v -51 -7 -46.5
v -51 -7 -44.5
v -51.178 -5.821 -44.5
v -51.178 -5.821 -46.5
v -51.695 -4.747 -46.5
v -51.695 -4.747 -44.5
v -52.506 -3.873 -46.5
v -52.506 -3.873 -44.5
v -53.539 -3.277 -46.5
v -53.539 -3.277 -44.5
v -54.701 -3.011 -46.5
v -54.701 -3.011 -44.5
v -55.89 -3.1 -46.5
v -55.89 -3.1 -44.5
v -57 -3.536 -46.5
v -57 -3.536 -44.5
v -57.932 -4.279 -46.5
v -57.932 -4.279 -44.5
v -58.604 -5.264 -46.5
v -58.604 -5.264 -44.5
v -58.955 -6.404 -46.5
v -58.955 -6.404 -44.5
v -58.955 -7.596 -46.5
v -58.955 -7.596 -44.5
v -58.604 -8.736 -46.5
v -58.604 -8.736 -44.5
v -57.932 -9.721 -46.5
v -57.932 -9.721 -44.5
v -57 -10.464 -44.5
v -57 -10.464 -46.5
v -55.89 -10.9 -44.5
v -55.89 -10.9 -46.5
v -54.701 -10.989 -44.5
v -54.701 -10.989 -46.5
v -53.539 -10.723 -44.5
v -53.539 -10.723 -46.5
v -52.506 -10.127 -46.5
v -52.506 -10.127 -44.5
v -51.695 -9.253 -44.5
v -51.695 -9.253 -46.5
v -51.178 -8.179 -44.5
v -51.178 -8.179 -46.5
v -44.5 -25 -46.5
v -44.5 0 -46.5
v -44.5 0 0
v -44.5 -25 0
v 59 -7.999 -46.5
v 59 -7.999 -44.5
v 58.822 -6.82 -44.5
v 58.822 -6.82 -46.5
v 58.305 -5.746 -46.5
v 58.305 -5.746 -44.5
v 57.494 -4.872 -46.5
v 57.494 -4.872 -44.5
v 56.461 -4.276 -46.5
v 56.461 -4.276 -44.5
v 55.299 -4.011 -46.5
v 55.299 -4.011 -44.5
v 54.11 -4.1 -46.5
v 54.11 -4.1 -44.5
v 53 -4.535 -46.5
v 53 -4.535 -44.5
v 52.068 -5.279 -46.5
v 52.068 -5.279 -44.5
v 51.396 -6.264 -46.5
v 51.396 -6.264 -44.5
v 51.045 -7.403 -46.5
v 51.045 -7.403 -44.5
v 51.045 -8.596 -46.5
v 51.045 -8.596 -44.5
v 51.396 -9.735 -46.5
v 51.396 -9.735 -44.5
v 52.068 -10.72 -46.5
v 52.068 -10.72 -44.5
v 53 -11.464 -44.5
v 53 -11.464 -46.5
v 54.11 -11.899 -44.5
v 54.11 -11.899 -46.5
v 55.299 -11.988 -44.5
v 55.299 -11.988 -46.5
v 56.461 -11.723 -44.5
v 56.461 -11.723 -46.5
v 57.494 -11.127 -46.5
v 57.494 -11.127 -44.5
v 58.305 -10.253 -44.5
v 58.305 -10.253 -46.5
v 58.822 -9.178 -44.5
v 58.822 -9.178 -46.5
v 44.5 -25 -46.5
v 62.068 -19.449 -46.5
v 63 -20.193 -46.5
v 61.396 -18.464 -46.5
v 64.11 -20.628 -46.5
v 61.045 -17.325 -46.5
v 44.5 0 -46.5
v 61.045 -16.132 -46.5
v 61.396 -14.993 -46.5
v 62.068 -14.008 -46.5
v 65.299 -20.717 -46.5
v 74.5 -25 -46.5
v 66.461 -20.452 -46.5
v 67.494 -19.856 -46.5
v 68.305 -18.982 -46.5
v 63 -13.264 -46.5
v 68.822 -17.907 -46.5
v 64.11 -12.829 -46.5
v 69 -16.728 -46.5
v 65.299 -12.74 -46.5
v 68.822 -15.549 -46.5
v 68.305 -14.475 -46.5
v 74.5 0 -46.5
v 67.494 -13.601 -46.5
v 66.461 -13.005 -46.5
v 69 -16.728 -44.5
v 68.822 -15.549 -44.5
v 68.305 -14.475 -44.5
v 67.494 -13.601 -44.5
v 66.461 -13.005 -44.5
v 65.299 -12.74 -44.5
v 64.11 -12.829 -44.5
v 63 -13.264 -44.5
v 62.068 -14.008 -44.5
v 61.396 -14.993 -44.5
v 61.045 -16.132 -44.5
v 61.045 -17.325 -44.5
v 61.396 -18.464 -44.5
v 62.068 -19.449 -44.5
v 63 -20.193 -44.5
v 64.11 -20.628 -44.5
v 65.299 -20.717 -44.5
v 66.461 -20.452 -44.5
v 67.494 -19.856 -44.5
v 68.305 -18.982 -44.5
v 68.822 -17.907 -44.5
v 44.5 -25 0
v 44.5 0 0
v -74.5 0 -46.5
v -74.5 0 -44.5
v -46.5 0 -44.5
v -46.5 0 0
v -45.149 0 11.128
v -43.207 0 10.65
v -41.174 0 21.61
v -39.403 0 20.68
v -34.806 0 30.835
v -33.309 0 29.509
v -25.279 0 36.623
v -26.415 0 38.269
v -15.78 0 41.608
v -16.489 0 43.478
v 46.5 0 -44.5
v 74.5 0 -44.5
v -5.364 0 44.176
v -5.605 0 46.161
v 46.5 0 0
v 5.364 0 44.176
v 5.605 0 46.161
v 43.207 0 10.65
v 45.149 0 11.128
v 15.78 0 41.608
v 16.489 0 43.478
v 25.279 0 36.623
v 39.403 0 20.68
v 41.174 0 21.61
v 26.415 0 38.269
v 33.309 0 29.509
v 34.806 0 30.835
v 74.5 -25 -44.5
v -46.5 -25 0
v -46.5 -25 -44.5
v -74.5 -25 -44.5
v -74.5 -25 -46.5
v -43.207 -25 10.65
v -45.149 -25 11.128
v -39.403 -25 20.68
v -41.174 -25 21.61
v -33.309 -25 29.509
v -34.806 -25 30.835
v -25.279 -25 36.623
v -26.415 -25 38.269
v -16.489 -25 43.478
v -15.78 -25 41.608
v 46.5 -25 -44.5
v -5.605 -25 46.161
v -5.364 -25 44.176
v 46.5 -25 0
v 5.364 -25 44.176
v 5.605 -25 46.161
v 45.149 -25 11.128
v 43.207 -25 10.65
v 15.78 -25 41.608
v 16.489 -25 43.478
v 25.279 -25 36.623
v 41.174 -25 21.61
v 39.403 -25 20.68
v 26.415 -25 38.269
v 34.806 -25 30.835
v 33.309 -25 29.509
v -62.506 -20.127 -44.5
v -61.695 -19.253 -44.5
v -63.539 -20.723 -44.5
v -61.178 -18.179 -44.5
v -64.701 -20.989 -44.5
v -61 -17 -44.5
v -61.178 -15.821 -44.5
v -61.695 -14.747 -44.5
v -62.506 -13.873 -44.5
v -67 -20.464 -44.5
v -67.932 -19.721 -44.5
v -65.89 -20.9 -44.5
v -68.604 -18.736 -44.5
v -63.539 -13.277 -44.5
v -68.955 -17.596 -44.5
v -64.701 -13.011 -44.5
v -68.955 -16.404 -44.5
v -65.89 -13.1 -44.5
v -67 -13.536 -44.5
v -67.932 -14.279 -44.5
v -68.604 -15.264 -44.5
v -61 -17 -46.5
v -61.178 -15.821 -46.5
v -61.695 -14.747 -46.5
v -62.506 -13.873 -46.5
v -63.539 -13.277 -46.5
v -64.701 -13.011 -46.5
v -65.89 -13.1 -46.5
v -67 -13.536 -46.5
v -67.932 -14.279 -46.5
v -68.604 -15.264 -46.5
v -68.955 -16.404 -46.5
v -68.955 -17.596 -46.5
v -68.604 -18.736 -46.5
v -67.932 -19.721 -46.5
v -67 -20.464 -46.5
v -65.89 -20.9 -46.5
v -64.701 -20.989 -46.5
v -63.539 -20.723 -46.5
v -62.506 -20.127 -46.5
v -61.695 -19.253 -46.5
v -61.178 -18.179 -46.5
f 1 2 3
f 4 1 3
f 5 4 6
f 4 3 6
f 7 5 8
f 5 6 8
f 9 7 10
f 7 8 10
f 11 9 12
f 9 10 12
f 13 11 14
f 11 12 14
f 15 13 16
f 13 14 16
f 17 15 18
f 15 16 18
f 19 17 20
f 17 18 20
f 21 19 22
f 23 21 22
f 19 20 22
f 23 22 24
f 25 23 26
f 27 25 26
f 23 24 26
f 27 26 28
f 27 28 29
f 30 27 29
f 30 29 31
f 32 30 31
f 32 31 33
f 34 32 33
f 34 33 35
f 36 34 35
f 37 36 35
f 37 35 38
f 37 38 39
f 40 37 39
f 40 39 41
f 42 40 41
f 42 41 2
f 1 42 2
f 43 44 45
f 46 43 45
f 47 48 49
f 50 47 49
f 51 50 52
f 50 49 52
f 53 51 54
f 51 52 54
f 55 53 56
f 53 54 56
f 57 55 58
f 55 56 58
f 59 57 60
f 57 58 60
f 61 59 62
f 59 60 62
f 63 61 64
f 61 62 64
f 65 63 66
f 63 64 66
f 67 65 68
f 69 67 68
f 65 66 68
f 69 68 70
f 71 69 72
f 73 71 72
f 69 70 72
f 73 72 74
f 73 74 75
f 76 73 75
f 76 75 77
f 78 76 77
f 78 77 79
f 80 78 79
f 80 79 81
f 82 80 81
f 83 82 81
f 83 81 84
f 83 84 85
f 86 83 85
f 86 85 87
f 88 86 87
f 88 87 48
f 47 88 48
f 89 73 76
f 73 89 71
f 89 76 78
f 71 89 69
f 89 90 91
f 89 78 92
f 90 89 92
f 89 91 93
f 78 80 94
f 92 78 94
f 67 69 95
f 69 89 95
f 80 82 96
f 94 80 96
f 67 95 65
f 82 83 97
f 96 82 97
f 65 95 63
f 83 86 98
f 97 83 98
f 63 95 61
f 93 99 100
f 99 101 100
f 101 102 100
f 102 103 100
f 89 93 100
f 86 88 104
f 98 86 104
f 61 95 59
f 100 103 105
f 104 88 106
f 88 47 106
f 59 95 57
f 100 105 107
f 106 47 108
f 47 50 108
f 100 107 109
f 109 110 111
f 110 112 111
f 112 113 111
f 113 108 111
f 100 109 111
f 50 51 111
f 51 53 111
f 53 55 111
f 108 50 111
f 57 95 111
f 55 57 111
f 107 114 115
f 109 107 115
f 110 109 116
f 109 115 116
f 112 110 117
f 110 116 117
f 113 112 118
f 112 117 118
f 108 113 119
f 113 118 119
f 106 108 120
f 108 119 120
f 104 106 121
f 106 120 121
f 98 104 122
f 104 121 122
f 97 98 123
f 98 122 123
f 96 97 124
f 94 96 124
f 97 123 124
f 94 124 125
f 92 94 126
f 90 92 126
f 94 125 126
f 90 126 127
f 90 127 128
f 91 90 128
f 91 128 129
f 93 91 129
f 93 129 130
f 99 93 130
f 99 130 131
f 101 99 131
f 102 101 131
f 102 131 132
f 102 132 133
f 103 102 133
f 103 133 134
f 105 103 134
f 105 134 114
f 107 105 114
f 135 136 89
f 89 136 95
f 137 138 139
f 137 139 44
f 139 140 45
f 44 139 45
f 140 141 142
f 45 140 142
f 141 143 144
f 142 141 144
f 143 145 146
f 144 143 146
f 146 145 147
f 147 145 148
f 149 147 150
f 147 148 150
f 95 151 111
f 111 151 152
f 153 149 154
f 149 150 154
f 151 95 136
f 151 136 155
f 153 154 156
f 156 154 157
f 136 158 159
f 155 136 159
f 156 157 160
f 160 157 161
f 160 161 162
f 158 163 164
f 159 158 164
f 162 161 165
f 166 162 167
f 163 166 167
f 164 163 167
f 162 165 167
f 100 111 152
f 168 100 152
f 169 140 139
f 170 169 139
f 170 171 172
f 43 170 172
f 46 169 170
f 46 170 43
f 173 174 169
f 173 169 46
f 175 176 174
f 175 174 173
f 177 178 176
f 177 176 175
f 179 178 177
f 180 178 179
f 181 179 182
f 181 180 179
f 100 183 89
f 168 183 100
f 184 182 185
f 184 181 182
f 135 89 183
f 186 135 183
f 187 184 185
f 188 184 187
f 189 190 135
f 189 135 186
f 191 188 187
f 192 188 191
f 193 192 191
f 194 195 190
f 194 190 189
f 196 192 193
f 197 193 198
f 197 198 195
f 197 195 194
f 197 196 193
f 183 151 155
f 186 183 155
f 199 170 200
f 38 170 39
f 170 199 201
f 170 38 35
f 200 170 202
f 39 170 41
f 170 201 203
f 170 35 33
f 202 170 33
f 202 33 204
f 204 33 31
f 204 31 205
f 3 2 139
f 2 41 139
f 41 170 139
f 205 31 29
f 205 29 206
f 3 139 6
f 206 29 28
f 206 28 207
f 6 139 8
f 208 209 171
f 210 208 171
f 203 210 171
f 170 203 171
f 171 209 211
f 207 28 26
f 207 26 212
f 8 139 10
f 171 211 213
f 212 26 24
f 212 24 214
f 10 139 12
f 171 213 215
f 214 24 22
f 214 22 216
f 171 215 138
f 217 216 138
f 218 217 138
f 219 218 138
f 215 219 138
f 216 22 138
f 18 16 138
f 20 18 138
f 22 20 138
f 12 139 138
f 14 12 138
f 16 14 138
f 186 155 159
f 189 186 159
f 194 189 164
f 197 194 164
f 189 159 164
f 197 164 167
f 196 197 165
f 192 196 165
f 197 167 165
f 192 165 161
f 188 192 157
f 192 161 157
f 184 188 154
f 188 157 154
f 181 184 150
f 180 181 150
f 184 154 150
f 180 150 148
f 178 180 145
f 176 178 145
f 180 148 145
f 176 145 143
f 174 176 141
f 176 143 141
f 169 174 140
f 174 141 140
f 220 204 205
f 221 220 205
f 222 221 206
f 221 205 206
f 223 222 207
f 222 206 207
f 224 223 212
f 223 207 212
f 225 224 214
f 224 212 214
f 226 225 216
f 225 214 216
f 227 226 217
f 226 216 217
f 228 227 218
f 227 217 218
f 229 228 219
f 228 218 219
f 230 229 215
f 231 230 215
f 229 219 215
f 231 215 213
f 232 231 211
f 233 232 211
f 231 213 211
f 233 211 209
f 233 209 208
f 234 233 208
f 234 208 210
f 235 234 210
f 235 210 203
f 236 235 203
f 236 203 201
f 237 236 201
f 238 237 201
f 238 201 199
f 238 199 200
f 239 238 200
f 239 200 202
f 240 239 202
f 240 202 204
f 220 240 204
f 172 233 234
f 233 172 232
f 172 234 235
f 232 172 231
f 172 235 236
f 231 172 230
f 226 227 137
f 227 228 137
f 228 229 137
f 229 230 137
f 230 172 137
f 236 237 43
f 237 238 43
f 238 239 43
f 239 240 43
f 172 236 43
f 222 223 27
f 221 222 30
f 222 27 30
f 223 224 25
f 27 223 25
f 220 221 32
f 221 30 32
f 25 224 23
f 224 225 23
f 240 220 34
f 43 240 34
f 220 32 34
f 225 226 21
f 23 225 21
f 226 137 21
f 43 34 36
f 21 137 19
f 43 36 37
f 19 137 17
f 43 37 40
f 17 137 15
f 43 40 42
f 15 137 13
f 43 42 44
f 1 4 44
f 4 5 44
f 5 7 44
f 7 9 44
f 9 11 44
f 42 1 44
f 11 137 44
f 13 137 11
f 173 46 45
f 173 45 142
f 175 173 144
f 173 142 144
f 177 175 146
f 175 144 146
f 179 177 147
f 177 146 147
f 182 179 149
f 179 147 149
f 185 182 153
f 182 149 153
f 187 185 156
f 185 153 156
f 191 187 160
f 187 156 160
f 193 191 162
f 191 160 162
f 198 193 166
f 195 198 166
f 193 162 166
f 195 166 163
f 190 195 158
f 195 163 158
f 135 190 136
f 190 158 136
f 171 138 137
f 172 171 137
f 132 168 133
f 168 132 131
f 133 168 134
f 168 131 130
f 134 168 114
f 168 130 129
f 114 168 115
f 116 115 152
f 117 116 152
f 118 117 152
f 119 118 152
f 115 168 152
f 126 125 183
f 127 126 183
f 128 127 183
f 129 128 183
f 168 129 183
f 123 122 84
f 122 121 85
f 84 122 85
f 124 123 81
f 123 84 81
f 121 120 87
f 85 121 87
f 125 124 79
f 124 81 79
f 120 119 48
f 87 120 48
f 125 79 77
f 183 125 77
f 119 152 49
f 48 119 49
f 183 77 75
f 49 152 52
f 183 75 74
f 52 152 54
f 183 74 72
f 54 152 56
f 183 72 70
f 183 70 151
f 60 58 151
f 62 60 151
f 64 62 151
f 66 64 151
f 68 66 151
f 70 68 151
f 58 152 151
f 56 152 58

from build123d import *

# Parameters (mm, degrees)
F1_DEPTH = 25
F2_R     = 4
F3_DEPTH = 2.001


with BuildPart() as f1:
    # F0 (on Front) → F1 (new body)
    with BuildSketch(Plane.XZ):
        with BuildLine():
            ThreePointArc((-44.5, 0), (0, 44.5), (44.5, 0))
            Line((44.5, 0), (44.5, -46.5))
            Line((44.5, -46.5), (74.5, -46.5))
            Line((74.5, -46.5), (74.5, -44.5))
            Line((74.5, -44.5), (46.5, -44.5))
            Line((46.5, -44.5), (46.5, 0))
            ThreePointArc((46.5, 0), (0, 46.5), (-46.5, 0))
            Line((-46.5, 0), (-46.5, -44.5))
            Line((-46.5, -44.5), (-74.5, -44.5))
            Line((-74.5, -44.5), (-74.5, -46.5))
            Line((-74.5, -46.5), (-44.5, -46.5))
            Line((-44.5, -46.5), (-44.5, 0))
        make_face()
    extrude(amount=F1_DEPTH)

    # F2 (on face) → F3 (cut, through all)
    with BuildSketch(Plane.XY.offset(-44.5)):
        with Locations((-65, -17)):
            Circle(F2_R)
        with Locations((-55, -7)):
            Circle(F2_R)
        with Locations((55, -7.999404)):
            Circle(F2_R)
        with Locations((65, -16.7284)):
            Circle(F2_R)
    extrude(amount=-F3_DEPTH, mode=Mode.SUBTRACT)


solid = f1.part
